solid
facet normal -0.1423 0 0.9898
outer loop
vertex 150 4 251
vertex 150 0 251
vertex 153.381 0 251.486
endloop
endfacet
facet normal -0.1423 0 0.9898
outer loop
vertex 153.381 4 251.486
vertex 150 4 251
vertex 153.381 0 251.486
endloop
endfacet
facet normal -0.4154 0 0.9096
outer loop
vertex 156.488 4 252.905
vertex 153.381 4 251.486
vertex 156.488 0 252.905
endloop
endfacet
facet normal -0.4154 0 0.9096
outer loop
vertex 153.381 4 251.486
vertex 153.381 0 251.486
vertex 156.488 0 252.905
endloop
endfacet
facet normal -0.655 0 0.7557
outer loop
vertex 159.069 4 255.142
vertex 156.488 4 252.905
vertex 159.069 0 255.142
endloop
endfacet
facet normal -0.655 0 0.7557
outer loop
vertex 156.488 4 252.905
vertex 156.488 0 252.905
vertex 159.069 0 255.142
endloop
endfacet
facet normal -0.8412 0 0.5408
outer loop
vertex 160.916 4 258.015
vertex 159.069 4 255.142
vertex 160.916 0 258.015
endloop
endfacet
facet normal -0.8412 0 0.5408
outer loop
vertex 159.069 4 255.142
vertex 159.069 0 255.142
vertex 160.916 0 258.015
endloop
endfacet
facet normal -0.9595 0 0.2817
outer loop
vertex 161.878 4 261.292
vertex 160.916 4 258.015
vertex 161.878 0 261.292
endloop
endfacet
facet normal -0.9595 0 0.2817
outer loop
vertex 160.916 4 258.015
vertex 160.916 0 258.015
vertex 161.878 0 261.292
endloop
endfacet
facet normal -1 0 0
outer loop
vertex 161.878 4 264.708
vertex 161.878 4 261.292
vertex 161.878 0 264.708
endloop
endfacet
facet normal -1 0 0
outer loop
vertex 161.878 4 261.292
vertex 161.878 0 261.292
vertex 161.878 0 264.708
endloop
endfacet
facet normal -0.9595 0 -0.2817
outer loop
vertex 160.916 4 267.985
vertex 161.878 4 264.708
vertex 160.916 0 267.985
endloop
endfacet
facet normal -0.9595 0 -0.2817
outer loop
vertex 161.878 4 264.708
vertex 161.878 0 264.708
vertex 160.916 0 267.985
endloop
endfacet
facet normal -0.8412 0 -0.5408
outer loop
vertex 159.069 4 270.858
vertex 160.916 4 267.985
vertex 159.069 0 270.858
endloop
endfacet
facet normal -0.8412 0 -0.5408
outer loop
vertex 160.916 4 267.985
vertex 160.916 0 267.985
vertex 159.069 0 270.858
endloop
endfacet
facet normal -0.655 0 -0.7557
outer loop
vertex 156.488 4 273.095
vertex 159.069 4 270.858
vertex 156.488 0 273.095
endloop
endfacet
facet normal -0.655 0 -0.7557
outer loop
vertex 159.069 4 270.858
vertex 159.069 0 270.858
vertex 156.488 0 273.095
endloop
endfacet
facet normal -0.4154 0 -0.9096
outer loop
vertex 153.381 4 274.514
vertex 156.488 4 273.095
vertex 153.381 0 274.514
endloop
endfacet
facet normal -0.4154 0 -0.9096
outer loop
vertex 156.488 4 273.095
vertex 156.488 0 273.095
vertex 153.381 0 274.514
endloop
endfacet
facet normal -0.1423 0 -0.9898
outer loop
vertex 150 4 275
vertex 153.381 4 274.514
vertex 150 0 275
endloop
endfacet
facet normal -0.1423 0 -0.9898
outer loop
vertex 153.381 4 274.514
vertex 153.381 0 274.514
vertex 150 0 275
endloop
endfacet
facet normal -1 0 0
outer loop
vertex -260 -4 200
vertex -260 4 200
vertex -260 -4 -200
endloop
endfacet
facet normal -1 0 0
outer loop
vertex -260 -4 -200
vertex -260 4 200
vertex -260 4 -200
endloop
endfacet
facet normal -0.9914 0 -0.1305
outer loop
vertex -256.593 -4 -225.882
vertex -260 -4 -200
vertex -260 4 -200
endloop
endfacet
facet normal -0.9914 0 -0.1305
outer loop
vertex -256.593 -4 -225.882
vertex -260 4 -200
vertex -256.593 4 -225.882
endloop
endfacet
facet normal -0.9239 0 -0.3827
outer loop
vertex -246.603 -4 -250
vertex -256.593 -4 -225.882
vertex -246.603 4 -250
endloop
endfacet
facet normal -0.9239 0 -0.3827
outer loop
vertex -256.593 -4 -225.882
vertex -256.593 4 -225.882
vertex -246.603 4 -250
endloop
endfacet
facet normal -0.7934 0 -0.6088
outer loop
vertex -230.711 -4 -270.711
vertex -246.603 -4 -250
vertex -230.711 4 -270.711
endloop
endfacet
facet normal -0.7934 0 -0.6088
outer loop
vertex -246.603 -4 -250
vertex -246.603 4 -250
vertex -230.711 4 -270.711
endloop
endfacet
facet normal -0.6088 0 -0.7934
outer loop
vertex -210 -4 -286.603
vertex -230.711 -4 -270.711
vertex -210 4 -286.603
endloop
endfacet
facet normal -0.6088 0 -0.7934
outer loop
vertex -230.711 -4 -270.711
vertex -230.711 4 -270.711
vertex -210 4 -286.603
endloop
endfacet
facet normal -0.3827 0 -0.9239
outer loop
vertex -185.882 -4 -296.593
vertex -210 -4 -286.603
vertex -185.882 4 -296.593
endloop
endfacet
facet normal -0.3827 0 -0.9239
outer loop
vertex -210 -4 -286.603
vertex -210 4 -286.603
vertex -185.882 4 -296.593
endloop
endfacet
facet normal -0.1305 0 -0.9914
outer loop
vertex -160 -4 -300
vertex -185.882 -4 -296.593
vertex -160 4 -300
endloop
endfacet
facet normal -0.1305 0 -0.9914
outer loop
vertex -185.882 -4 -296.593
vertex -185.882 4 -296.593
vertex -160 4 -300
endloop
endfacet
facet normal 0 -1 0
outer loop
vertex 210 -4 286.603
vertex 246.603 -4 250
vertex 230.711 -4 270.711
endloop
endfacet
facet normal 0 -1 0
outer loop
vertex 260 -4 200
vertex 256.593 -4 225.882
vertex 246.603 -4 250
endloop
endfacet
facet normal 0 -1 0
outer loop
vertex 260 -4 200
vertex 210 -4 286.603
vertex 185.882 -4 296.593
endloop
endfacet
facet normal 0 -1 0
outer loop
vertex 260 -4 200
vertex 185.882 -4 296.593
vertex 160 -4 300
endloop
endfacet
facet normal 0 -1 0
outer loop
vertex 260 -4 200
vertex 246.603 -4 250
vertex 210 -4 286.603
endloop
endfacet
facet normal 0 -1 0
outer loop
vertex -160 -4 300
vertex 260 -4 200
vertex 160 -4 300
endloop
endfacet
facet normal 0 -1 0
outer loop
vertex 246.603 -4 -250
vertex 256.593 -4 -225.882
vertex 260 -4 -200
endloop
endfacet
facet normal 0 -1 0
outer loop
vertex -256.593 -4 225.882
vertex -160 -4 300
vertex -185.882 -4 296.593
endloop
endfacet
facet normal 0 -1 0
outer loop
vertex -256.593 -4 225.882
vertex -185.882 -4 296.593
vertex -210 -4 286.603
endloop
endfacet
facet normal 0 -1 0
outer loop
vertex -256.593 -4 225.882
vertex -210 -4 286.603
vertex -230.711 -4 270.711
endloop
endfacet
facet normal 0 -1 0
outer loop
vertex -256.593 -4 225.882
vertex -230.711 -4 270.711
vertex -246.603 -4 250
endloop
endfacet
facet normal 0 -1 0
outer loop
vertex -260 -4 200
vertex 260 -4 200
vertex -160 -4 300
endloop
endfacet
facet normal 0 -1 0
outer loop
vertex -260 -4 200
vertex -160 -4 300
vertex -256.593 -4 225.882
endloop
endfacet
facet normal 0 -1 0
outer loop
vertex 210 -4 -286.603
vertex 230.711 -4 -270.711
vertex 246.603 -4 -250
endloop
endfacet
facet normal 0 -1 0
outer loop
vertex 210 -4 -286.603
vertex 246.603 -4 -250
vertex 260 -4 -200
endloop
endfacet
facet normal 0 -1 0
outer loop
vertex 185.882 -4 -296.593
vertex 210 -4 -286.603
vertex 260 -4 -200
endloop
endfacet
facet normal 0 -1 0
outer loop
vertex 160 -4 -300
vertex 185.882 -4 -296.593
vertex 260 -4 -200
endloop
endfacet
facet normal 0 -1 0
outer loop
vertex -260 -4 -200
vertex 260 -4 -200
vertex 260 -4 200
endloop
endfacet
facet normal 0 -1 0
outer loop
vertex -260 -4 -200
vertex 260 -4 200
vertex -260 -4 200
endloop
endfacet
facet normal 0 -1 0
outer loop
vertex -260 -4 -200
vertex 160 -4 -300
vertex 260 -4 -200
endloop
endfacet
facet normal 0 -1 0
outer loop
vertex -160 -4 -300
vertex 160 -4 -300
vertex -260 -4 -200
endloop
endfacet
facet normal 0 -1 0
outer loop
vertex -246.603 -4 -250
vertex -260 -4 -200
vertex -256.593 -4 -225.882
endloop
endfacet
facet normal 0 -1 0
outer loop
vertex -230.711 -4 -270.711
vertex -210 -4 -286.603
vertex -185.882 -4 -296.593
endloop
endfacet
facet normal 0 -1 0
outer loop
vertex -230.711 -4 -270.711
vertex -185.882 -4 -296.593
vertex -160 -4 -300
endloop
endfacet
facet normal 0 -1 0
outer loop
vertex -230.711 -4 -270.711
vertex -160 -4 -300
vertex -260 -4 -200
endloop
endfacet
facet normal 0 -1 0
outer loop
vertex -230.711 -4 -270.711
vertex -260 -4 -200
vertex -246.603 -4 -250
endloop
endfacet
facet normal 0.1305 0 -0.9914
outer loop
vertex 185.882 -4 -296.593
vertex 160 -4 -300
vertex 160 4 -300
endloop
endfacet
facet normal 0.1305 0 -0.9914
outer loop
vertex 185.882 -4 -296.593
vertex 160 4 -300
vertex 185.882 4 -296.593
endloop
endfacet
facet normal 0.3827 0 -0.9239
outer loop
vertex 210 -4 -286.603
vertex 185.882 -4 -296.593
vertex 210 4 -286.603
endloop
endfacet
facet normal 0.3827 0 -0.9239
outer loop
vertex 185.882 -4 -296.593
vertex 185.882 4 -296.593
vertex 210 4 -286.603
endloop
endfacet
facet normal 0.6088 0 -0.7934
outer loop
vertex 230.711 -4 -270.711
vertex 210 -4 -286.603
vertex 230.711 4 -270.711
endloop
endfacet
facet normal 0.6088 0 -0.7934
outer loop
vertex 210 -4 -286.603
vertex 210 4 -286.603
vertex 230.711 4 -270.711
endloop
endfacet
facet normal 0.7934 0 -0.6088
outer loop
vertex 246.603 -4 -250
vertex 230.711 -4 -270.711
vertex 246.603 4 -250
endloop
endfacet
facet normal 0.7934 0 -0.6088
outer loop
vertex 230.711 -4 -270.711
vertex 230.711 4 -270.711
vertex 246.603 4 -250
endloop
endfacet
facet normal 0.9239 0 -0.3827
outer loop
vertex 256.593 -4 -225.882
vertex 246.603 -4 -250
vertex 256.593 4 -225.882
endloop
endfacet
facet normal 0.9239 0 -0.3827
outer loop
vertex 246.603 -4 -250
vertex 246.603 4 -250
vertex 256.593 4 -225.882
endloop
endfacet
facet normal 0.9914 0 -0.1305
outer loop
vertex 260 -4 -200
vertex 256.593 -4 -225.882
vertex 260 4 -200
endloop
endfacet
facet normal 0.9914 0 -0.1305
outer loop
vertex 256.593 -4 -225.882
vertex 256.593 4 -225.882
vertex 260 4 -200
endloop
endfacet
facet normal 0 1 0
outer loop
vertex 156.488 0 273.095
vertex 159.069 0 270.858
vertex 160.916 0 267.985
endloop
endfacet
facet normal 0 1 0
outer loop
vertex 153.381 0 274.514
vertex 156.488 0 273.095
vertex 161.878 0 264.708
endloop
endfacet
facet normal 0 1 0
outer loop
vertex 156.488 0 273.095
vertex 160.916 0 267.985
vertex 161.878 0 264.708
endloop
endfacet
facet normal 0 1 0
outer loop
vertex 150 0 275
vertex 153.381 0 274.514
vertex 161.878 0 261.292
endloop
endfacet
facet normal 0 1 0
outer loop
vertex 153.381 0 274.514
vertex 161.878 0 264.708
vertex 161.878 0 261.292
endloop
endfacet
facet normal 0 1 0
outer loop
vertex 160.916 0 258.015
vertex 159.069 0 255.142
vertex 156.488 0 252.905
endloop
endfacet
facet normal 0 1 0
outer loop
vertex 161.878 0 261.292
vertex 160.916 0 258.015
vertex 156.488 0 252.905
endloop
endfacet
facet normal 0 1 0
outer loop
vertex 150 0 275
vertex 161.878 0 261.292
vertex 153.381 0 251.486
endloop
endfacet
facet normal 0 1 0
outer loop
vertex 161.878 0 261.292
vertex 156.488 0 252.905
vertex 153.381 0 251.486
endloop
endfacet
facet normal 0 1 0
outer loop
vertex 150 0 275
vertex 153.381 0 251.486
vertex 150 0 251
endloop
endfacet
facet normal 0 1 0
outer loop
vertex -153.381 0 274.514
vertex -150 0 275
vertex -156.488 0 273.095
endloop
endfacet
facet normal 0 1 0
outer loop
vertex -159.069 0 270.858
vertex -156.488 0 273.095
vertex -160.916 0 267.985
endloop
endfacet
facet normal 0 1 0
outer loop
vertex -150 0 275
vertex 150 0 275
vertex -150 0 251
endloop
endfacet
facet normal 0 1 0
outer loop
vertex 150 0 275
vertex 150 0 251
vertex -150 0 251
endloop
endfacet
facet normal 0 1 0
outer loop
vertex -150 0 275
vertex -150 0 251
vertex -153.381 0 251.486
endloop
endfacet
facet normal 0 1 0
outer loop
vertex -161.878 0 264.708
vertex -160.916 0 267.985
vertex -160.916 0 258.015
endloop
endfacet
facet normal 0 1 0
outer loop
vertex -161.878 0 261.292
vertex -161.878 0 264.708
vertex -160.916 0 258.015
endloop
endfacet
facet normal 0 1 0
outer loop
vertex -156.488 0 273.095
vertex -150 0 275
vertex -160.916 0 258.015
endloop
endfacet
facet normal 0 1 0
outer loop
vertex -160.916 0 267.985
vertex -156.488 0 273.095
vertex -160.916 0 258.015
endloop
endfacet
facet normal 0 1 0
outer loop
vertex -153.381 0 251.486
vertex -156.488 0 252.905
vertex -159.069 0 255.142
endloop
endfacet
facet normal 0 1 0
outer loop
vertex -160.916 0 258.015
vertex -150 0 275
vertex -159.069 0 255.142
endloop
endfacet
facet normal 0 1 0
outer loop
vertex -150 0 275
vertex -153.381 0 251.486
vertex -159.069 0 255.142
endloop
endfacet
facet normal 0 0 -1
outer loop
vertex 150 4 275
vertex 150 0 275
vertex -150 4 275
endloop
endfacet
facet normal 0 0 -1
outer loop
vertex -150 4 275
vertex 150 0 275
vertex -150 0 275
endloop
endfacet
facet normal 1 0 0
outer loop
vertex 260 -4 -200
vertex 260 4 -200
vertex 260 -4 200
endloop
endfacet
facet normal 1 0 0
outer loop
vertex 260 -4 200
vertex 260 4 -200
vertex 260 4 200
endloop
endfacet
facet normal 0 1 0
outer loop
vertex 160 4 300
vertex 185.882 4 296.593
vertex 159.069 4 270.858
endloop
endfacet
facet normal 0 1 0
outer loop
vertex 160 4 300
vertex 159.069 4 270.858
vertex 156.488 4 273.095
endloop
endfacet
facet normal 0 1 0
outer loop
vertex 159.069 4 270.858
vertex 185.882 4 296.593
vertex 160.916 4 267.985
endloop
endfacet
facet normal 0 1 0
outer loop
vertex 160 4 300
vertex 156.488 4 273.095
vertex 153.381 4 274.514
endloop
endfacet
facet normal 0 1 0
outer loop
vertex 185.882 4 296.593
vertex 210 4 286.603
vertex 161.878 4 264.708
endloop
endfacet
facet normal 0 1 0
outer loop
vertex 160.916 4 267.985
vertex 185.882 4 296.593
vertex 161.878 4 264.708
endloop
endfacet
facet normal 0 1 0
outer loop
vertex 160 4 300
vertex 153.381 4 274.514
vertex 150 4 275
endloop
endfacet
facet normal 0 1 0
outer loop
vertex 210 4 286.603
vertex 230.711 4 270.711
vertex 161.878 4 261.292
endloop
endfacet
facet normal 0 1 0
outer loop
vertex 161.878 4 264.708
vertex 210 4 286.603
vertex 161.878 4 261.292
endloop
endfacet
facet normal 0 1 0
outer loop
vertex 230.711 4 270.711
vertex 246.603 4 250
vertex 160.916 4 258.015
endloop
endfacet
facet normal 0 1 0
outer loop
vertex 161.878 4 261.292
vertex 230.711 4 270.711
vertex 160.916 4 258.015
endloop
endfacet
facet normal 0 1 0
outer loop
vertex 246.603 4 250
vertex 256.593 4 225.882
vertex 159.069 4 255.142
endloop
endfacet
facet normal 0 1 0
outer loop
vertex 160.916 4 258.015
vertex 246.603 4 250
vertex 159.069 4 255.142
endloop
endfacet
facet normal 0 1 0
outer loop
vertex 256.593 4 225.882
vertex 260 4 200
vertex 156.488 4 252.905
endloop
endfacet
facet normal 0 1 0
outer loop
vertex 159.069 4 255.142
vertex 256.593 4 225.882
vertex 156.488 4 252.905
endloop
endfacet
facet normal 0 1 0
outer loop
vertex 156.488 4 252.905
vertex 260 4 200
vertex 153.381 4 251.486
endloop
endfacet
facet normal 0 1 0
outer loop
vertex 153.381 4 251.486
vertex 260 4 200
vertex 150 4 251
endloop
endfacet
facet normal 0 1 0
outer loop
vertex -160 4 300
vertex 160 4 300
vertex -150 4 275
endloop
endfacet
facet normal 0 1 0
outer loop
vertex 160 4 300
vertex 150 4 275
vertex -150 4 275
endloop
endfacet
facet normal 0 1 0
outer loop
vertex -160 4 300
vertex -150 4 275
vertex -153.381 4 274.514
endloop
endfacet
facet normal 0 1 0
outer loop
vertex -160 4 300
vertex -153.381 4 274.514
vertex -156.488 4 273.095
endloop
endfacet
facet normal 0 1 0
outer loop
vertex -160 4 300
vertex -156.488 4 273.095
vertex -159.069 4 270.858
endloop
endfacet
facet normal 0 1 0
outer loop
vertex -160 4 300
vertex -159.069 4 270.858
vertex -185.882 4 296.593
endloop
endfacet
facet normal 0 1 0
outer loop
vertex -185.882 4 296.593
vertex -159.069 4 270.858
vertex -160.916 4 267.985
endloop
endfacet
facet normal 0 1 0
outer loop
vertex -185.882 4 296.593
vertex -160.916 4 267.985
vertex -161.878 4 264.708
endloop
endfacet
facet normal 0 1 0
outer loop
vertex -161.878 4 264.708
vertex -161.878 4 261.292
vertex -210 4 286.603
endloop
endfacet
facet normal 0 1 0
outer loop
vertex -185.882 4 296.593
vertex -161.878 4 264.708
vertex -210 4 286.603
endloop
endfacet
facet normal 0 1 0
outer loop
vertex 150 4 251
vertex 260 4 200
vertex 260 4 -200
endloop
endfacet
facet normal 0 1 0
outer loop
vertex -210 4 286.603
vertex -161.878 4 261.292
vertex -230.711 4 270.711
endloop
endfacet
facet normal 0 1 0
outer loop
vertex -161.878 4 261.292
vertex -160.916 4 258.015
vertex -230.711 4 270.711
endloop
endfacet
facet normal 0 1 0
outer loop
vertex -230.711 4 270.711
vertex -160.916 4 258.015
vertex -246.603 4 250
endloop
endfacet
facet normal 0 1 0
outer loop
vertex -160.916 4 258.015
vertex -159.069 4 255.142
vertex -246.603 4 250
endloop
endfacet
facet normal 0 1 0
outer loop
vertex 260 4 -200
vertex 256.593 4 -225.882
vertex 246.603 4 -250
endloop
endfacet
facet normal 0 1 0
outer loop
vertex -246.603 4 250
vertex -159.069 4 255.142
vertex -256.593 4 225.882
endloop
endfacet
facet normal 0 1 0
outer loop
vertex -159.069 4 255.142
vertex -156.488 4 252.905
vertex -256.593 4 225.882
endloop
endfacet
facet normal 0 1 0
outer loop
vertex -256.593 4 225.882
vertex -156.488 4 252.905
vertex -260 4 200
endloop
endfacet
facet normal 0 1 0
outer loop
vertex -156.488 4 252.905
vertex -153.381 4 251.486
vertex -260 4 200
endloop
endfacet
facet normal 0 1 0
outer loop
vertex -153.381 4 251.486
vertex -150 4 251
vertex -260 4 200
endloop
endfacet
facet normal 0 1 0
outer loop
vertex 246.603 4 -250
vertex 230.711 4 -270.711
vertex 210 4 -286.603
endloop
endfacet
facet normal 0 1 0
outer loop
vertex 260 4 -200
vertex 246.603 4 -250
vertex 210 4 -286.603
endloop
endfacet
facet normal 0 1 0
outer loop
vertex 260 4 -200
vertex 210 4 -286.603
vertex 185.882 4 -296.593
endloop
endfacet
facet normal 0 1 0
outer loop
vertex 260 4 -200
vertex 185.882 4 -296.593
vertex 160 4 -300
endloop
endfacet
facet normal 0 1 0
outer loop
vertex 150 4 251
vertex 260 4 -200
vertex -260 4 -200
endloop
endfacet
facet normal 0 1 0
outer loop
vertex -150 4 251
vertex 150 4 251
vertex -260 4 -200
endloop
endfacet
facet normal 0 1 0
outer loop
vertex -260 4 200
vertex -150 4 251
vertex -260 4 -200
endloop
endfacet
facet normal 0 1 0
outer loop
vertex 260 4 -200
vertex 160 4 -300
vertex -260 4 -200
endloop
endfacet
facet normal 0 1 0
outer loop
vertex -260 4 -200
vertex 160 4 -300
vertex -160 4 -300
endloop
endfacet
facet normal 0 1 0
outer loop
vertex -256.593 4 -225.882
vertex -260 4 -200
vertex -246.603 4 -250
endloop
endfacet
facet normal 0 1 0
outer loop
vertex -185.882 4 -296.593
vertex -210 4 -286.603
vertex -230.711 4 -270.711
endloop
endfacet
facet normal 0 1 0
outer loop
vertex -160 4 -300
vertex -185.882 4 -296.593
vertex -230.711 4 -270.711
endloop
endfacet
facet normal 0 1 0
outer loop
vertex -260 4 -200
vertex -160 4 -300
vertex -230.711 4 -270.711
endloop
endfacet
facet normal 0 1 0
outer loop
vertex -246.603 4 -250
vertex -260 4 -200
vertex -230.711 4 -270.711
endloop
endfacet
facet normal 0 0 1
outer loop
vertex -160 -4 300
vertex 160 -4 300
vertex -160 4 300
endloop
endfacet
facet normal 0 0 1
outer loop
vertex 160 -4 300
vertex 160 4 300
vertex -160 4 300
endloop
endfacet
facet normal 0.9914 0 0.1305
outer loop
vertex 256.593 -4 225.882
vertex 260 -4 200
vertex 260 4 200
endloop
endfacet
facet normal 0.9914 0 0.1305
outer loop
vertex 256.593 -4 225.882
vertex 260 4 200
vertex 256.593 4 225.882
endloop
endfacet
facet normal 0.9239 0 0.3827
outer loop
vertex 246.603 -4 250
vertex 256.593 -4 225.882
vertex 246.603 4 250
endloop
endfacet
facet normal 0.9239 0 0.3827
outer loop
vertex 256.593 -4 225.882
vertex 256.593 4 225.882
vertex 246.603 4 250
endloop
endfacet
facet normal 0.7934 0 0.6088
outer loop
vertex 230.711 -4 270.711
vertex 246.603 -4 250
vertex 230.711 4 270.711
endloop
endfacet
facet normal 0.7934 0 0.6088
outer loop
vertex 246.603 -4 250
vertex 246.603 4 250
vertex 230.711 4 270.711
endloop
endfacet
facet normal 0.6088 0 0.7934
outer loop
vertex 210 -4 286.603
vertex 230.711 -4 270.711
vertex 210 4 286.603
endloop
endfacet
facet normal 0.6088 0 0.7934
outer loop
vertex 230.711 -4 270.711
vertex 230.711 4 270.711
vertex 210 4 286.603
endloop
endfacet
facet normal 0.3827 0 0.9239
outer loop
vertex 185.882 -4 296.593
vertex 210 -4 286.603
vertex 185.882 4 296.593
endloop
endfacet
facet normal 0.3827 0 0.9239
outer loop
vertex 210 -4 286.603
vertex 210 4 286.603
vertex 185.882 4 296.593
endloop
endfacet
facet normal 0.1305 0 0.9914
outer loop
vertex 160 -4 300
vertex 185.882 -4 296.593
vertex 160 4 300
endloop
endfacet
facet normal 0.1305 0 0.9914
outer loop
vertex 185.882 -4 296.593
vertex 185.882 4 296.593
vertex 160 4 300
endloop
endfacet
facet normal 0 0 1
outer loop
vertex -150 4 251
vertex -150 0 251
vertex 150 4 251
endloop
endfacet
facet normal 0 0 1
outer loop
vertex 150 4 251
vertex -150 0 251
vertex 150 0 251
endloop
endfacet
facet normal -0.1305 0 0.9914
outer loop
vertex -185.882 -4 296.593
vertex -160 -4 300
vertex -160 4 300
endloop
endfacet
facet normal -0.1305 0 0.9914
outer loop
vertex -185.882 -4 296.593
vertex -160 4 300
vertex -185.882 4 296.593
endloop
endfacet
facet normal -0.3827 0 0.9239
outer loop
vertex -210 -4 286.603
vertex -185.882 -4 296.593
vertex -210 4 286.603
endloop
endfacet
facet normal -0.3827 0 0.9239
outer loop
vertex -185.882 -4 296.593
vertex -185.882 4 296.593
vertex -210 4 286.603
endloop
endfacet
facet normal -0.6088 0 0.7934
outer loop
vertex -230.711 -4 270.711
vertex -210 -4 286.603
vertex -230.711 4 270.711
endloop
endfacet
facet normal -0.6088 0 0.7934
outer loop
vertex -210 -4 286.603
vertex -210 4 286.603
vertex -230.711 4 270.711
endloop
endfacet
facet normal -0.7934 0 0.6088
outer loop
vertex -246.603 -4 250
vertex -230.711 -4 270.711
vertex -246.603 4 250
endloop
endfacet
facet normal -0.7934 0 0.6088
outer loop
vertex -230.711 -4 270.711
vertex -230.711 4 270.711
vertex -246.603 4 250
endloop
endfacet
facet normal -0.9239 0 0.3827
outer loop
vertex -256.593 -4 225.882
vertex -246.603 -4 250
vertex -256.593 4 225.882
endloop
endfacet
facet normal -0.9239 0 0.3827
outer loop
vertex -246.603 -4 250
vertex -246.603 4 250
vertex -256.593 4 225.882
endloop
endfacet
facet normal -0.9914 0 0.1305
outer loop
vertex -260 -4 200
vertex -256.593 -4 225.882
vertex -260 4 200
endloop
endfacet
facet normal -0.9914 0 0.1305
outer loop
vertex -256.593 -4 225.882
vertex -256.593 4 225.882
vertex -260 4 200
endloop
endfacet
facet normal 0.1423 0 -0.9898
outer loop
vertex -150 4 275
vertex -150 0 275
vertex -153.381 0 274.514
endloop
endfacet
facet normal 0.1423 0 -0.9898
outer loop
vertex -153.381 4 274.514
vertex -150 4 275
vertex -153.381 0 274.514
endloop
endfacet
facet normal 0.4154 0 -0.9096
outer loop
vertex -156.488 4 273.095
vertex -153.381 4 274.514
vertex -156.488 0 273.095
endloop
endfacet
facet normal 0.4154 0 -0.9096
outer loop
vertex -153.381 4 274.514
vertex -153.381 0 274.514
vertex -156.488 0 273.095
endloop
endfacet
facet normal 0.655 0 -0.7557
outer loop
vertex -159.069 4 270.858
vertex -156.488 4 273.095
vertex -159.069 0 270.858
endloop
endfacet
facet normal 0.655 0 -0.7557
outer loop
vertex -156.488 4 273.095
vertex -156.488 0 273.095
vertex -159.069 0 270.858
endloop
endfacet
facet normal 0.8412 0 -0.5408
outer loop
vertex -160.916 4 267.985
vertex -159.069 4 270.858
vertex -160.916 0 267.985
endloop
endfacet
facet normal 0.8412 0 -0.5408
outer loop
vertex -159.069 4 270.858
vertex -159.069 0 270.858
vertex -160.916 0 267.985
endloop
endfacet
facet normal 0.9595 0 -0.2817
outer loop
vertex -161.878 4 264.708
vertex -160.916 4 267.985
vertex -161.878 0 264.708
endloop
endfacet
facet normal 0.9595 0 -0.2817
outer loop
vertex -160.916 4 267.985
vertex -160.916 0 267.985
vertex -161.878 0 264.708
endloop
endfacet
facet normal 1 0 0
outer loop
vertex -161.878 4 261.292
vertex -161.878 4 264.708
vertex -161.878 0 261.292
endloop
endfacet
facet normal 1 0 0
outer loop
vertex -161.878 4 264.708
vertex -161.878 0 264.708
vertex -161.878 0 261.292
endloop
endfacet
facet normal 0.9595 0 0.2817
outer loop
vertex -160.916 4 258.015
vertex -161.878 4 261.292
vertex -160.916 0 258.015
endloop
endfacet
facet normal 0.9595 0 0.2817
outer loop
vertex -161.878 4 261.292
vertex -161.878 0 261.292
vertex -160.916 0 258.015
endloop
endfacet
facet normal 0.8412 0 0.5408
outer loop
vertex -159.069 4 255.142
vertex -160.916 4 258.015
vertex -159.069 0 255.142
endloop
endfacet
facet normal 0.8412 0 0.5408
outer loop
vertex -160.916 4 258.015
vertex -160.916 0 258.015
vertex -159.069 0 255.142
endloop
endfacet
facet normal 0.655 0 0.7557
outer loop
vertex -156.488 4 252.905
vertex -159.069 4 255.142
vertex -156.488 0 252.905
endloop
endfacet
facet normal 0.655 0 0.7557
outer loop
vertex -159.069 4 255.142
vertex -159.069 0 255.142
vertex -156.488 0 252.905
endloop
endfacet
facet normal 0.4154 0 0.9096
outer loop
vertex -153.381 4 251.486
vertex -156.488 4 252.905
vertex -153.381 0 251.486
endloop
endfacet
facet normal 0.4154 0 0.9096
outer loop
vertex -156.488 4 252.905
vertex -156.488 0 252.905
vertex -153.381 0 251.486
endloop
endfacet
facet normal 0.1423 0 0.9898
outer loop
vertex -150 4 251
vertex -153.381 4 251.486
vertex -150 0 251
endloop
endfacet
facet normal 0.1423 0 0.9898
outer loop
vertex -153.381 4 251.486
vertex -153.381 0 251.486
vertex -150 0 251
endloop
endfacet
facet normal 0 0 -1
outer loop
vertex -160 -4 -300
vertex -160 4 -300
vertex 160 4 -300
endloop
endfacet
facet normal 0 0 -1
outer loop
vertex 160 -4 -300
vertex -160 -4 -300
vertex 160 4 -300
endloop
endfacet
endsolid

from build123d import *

# Parameters (mm, degrees)
CHAPAINFERIOR_DEPTH   = 4
CORTE_EXTRUS_O1_DEPTH = 398.008816023


with BuildPart() as part:
    # Chapa inferior → ChapaInferior (new, symmetric)
    with BuildSketch(Plane(origin=(0, 0, 0), x_dir=(1, 0, 0), z_dir=(0, 1, 0))):
        with BuildLine():
            Line((-160, 300), (160, 300))
            ThreePointArc((160, 300), (230.710678119, 270.710678119), (260, 200))
            Line((260, 200), (260, -200))
            ThreePointArc((260, -200), (230.710678119, -270.710678119), (160, -300))
            Line((160, -300), (-160, -300))
            ThreePointArc((-160, -300), (-230.710678119, -270.710678119), (-260, -200))
            Line((-260, -200), (-260, 200))
            ThreePointArc((-260, 200), (-230.710678119, 270.710678119), (-160, 300))
        make_face()
    extrude(amount=CHAPAINFERIOR_DEPTH, both=True)

    # Esboço2 → Corte-extrusão1 (cut, through all)
    with BuildSketch(Plane(origin=(0, 0, 0), x_dir=(1, 0, 0), z_dir=(0, 1, 0))):
        with BuildLine():
            Line((-150, -251), (150, -251))
            ThreePointArc((150, -251), (162, -263), (150, -275))
            Line((150, -275), (-150, -275))
            ThreePointArc((-150, -275), (-162, -263), (-150, -251))
        make_face()
    extrude(amount=CORTE_EXTRUS_O1_DEPTH, mode=Mode.SUBTRACT)


solid = part.part
